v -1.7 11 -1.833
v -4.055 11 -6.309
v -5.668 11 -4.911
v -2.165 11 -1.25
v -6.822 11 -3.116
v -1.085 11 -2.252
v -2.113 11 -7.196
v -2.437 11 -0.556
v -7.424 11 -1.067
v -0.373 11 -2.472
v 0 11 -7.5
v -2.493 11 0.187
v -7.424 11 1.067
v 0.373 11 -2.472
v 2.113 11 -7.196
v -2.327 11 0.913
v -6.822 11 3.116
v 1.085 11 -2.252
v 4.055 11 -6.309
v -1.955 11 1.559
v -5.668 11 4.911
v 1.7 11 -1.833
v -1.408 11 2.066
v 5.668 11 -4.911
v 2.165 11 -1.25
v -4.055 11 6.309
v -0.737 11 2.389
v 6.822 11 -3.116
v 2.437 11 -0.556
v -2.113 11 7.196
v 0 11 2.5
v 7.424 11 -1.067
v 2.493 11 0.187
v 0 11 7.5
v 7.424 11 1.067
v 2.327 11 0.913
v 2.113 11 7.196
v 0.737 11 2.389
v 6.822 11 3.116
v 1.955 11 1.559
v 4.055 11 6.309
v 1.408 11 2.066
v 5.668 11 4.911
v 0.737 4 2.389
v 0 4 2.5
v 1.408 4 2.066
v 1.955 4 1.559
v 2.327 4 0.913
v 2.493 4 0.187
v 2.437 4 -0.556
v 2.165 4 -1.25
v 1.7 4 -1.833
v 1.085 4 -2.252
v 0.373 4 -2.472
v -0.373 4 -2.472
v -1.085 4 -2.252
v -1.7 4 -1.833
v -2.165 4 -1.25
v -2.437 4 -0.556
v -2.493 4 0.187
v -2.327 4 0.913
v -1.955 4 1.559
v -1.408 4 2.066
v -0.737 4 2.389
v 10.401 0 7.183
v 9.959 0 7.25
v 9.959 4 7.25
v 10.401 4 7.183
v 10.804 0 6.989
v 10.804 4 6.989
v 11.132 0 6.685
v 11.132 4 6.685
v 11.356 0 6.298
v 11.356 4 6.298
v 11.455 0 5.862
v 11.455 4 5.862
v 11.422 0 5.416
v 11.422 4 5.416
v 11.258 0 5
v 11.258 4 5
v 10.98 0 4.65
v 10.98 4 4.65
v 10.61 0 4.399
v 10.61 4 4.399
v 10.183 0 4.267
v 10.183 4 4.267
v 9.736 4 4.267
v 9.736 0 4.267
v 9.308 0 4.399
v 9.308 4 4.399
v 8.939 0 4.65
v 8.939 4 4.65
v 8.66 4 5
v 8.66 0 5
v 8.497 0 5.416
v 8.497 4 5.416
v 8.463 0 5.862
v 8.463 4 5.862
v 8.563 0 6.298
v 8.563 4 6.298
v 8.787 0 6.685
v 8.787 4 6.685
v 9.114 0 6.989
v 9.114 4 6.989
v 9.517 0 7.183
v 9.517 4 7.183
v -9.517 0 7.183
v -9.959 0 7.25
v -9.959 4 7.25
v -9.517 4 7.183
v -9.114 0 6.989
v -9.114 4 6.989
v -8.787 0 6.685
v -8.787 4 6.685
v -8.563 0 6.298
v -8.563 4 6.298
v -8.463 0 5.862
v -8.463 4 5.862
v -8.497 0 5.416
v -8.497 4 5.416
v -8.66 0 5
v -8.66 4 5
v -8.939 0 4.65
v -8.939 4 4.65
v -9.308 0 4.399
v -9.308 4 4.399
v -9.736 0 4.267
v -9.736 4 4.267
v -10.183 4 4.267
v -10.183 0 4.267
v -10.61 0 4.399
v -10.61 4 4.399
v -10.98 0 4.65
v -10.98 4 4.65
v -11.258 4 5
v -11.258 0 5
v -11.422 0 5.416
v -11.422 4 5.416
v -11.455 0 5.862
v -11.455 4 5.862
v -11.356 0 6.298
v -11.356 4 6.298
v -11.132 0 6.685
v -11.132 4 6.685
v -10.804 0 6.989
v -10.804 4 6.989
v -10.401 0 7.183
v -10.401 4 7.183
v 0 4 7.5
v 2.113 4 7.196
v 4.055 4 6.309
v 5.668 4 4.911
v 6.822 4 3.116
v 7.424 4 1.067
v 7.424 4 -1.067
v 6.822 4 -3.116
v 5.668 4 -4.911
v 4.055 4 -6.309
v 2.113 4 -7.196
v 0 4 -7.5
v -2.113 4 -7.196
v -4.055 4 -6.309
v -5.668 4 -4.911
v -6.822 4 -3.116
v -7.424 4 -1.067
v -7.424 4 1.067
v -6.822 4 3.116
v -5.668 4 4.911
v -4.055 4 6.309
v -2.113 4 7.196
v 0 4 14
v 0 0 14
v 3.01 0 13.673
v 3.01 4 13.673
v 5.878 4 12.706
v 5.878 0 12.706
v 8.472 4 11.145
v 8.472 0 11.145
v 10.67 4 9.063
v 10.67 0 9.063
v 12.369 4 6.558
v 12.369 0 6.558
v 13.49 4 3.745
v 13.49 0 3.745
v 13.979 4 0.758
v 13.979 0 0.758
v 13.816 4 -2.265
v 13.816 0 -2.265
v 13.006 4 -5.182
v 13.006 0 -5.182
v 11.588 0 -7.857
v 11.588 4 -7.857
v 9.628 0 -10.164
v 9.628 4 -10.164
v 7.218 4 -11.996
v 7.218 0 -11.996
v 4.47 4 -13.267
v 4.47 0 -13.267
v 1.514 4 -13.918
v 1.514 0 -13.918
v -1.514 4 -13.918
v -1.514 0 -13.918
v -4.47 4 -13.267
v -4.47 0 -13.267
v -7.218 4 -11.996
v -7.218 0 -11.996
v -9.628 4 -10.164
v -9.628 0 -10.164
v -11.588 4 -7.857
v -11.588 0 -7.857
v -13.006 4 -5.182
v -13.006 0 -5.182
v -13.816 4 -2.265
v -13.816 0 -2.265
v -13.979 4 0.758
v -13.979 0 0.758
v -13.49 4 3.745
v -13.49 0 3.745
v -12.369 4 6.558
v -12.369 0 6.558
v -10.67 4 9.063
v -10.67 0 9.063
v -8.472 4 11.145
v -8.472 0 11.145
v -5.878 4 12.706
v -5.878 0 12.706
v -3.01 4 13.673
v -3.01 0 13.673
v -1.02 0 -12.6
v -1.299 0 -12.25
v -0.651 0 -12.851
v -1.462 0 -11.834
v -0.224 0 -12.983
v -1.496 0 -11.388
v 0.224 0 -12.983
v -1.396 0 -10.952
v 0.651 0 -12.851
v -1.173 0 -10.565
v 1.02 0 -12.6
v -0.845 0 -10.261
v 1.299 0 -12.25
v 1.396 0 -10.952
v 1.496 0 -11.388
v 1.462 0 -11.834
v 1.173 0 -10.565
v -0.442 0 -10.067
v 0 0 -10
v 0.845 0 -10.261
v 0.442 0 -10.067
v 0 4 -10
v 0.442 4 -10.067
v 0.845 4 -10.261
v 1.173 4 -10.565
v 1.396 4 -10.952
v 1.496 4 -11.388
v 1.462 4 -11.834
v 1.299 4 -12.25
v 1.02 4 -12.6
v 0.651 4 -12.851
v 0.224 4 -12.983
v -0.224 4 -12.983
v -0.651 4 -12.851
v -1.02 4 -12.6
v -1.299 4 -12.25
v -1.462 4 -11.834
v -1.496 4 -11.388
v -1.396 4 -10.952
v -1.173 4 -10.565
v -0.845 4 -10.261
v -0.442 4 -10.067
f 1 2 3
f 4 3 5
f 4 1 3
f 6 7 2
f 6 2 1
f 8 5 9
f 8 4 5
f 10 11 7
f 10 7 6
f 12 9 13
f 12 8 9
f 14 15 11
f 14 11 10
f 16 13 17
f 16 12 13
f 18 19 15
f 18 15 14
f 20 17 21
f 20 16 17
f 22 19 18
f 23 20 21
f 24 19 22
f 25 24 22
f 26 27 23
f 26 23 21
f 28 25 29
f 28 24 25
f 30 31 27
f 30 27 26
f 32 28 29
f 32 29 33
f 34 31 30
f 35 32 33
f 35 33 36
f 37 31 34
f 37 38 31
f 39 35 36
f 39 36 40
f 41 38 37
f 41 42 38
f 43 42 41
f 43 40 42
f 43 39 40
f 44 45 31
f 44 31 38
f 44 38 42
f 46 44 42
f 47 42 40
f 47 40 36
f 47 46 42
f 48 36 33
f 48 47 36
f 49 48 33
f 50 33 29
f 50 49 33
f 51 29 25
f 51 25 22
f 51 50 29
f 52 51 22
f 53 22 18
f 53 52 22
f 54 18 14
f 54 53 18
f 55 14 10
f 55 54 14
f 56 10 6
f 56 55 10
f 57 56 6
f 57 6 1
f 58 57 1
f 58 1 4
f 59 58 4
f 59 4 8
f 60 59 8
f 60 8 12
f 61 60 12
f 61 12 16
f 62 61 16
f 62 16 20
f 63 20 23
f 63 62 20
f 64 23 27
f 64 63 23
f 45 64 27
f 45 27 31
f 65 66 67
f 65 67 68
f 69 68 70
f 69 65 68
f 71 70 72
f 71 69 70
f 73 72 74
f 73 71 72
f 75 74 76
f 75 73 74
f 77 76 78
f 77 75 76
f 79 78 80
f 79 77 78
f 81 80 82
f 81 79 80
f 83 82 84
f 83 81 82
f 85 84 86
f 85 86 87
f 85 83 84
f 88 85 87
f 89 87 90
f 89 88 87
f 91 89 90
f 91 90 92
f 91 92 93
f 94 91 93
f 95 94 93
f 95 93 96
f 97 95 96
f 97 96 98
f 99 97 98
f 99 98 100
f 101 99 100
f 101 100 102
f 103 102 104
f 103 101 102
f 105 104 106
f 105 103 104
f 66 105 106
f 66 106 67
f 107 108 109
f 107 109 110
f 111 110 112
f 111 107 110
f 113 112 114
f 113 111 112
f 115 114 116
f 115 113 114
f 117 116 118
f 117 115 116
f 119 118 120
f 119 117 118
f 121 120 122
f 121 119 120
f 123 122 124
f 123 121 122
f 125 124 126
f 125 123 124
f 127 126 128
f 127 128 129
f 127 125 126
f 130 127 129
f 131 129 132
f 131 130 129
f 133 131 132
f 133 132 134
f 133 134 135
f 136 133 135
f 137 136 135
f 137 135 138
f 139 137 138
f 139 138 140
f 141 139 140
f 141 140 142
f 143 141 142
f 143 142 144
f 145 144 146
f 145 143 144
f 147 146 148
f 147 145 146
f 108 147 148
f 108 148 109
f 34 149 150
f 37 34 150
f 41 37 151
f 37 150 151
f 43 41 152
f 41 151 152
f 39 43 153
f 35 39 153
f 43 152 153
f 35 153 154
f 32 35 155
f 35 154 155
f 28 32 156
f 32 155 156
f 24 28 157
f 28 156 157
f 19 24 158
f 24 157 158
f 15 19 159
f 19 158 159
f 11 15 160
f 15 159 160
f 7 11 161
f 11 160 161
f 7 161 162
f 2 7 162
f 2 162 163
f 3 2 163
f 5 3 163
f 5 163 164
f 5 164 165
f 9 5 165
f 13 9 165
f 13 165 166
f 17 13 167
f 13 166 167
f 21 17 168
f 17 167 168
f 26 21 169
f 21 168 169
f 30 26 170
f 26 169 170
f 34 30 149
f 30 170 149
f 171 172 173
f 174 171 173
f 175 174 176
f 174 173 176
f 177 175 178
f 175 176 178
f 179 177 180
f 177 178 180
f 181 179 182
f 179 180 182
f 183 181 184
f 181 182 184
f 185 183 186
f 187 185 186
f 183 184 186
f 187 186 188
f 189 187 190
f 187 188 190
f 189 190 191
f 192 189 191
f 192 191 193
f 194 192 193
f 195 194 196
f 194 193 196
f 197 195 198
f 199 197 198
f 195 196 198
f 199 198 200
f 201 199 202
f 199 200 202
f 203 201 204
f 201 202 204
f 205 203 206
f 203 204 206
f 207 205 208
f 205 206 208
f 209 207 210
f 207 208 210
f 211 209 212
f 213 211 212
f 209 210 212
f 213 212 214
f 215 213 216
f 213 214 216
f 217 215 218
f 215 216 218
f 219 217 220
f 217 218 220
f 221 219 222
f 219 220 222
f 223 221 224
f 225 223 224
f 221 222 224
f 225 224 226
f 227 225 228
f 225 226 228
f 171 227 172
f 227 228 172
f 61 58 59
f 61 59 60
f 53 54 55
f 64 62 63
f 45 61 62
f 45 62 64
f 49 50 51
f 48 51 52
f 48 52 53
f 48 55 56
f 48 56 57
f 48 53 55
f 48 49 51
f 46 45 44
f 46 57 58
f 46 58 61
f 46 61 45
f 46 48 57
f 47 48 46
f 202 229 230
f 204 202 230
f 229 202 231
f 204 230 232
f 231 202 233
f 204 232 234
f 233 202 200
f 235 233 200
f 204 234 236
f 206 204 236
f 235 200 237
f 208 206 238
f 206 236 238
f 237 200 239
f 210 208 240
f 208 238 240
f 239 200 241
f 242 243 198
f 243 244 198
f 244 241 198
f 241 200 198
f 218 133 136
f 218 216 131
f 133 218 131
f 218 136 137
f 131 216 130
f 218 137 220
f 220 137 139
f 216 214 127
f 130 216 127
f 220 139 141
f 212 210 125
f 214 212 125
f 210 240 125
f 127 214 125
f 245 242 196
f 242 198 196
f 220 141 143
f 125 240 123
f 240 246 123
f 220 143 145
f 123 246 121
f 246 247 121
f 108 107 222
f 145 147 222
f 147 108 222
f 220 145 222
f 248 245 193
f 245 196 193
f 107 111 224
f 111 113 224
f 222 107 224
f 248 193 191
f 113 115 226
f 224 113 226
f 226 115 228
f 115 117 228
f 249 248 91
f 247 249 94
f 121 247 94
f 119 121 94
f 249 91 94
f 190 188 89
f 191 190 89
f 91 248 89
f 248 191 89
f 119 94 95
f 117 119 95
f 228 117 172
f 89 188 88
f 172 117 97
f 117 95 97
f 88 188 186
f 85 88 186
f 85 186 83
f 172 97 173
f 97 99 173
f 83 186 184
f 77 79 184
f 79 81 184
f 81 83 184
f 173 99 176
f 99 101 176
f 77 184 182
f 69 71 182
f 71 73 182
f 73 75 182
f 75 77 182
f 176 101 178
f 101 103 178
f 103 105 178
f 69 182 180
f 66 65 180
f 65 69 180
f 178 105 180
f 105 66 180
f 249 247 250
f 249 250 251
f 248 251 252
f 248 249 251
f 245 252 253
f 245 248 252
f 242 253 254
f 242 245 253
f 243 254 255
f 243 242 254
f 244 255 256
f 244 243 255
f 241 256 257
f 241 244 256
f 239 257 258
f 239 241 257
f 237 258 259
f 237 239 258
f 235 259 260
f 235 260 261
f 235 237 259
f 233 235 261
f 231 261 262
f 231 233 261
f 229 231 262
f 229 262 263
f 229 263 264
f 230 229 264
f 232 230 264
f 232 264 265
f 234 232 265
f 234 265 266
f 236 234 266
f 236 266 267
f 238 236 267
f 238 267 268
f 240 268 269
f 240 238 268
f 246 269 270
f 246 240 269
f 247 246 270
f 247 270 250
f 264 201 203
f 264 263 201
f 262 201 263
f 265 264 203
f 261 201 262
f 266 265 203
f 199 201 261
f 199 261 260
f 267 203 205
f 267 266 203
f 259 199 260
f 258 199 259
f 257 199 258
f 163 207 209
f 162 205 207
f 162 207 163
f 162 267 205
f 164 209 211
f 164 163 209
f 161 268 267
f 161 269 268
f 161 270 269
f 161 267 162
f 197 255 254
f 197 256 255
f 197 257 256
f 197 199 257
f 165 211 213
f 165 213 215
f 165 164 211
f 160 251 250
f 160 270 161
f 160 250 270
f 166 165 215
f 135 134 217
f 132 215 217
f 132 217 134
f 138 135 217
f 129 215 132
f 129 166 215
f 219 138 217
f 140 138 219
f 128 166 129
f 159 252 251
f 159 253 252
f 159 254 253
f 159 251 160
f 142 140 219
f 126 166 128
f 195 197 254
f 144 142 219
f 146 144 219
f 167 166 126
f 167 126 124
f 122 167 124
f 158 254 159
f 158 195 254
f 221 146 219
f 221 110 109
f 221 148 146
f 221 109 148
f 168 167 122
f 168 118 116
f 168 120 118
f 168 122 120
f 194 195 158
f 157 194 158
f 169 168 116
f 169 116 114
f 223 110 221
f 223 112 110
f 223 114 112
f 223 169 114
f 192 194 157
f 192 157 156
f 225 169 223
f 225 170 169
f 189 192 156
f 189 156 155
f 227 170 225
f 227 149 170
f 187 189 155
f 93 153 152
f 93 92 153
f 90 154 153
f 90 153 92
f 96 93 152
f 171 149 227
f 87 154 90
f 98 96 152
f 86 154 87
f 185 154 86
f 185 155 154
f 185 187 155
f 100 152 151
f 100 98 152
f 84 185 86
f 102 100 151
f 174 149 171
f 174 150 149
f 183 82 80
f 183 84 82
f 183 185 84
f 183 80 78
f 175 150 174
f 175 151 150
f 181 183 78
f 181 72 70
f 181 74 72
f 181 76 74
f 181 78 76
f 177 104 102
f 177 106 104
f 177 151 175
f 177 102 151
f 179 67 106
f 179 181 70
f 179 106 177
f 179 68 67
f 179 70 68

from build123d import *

# Parameters (mm, degrees)
SKETCH_1_R      = 14
SKETCH_1_R_2    = 1.5
EXTRUDE_1_DEPTH = 4
SKETCH_2_R      = 7.5
SKETCH_2_R_2    = 2.5
EXTRUDE_2_DEPTH = 7


with BuildPart() as part:
    # 草图1 → 凸台-拉伸1 (new body)
    with BuildSketch(Plane(origin=(0, 0, 0), x_dir=(1, 0, 0), z_dir=(0, 1, 0))):
        with Locations(Location((0, 0, 0), (0, 0, 270))):
            Circle(SKETCH_1_R)
        with Locations(Location((0, 11.5, 0), (0, 0, 270))):
            Circle(SKETCH_1_R_2, mode=Mode.SUBTRACT)
        with Locations(Location((9.959292144, -5.75, 0), (0, 0, 270))):
            Circle(SKETCH_1_R_2, mode=Mode.SUBTRACT)
        with Locations(Location((-9.959292144, -5.75, 0), (0, 0, 270))):
            Circle(SKETCH_1_R_2, mode=Mode.SUBTRACT)
    extrude(amount=EXTRUDE_1_DEPTH)

    # 草图2 → 凸台-拉伸2 (add)
    with BuildSketch(Plane(origin=(0, 4, 0), x_dir=(1, 0, 0), z_dir=(0, 1, 0))):
        with Locations(Location((0, 0, 0), (0, 0, 270))):
            Circle(SKETCH_2_R)
        with Locations(Location((0, 0, 0), (0, 0, 270))):
            Circle(SKETCH_2_R_2, mode=Mode.SUBTRACT)
    extrude(amount=EXTRUDE_2_DEPTH)


solid = part.part
